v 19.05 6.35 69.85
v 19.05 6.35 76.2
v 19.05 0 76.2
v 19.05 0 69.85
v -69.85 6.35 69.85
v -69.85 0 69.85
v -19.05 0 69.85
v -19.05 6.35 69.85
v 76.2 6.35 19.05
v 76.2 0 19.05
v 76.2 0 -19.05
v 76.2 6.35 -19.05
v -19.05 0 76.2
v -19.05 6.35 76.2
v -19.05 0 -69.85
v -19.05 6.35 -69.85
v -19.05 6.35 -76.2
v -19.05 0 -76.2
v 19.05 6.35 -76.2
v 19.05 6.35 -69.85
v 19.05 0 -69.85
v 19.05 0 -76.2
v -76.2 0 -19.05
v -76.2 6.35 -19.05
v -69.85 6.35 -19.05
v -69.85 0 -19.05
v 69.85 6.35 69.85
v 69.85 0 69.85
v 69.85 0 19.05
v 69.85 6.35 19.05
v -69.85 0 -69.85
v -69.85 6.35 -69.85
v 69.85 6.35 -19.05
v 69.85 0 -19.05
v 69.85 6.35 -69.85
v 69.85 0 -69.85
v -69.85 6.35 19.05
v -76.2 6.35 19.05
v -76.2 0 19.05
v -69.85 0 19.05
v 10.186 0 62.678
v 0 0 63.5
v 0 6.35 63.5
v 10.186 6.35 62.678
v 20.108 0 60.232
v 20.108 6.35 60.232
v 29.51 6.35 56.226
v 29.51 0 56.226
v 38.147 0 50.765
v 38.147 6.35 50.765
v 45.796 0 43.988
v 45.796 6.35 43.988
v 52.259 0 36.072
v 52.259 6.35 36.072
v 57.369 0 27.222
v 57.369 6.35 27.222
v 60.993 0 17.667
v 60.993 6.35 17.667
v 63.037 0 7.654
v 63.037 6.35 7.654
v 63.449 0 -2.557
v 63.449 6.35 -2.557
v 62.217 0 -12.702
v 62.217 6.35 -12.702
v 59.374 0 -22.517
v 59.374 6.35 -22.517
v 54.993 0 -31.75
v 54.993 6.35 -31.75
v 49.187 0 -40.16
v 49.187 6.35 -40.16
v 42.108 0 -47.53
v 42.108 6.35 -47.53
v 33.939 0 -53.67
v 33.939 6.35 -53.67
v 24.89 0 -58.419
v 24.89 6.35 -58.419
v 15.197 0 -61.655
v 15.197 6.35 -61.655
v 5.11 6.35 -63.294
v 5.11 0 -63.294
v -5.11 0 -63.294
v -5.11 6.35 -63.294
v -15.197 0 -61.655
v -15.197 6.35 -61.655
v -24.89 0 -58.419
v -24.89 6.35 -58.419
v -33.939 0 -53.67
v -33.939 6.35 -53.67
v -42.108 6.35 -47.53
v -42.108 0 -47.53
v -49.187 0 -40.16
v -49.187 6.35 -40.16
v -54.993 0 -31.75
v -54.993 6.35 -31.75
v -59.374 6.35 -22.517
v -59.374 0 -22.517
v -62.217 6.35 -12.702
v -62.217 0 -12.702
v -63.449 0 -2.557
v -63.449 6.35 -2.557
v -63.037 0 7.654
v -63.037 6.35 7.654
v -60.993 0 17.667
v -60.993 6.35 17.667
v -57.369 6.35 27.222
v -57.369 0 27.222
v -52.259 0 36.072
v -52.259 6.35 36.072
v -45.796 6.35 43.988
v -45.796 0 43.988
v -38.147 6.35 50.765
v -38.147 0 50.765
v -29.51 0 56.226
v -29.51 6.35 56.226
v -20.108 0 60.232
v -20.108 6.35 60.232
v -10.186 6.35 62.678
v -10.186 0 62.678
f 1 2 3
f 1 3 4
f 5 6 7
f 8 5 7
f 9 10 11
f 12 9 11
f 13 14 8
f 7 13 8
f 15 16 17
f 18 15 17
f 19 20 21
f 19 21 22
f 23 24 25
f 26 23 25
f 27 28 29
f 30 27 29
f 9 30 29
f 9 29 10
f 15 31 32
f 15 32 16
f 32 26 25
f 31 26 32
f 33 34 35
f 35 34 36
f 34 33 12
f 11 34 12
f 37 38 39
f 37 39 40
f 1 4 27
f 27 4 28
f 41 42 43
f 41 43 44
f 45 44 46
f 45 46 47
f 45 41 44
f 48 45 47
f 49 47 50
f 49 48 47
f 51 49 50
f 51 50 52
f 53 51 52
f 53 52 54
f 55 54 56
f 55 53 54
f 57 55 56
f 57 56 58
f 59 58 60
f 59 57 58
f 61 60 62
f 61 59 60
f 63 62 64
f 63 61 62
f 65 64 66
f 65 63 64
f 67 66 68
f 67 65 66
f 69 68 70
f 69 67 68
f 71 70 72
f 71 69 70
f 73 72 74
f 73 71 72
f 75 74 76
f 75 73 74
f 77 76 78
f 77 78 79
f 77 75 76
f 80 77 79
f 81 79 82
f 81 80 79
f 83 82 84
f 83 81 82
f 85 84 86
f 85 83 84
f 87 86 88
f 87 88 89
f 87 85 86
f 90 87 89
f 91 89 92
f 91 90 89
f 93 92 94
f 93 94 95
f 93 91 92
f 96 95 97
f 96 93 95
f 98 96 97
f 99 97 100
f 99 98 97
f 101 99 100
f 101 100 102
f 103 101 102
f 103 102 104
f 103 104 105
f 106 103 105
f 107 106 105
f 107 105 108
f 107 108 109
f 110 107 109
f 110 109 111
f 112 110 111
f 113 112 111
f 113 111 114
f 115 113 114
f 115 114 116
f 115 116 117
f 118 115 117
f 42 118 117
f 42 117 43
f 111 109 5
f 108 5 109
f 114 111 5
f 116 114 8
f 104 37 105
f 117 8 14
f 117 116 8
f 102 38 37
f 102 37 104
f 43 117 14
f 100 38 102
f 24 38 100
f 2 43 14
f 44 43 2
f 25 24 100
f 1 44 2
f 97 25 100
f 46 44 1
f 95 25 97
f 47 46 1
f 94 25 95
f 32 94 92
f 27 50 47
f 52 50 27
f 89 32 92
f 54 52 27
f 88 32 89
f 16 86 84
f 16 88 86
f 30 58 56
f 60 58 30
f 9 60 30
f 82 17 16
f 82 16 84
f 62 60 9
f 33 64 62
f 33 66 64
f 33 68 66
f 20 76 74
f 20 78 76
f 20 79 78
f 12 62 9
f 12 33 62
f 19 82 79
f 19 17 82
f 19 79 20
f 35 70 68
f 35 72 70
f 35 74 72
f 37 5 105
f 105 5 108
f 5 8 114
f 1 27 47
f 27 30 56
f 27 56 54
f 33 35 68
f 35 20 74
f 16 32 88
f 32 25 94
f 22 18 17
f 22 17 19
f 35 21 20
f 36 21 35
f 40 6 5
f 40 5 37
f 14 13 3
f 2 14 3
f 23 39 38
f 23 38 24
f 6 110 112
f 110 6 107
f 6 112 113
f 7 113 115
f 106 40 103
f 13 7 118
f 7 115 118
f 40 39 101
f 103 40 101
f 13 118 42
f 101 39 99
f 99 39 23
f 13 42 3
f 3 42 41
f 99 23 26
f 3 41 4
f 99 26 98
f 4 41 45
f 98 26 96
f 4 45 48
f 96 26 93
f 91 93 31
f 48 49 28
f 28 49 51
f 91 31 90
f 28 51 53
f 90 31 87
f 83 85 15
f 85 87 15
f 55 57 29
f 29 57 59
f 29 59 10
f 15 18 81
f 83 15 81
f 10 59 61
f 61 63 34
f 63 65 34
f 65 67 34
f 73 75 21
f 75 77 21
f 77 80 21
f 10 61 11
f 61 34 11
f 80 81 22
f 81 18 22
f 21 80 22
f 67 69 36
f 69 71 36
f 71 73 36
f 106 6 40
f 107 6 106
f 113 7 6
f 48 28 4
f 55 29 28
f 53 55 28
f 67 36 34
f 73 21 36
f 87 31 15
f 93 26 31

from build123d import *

# Parameters (mm, degrees)
SKETCH2_W           = 139.7
SKETCH2_H           = 139.7
SKETCH2_R           = 63.5
BOSS_EXTRUDE2_DEPTH = 6.35
SKETCH2_4_W         = 38.1
SKETCH2_4_H         = 6.35
SKETCH2_4_W_2       = 6.35
SKETCH2_4_H_2       = 38.1
BOSS_EXTRUDE3_DEPTH = 6.35


with BuildPart() as part:
    # Sketch2 → Boss-Extrude2 (new body)
    with BuildSketch(Plane(origin=(0, 0, 0), x_dir=(1, 0, 0), z_dir=(0, 1, 0))):
        Rectangle(SKETCH2_W, SKETCH2_H)
        Circle(SKETCH2_R, mode=Mode.SUBTRACT)
    extrude(amount=BOSS_EXTRUDE2_DEPTH)

    # Sketch2<4> → Boss-Extrude3 (add)
    with BuildSketch(Plane(origin=(0, 0, 0), x_dir=(1, 0, 0), z_dir=(0, 1, 0))):
        with Locations((0, -73.025)):
            Rectangle(SKETCH2_4_W, SKETCH2_4_H)
        with Locations((-73.025, 0)):
            Rectangle(SKETCH2_4_W_2, SKETCH2_4_H_2)
        with Locations((73.025, 0)):
            Rectangle(SKETCH2_4_W_2, SKETCH2_4_H_2)
        with Locations((0, 73.025)):
            Rectangle(SKETCH2_4_W, SKETCH2_4_H)
    extrude(amount=BOSS_EXTRUDE3_DEPTH)


solid = part.part
